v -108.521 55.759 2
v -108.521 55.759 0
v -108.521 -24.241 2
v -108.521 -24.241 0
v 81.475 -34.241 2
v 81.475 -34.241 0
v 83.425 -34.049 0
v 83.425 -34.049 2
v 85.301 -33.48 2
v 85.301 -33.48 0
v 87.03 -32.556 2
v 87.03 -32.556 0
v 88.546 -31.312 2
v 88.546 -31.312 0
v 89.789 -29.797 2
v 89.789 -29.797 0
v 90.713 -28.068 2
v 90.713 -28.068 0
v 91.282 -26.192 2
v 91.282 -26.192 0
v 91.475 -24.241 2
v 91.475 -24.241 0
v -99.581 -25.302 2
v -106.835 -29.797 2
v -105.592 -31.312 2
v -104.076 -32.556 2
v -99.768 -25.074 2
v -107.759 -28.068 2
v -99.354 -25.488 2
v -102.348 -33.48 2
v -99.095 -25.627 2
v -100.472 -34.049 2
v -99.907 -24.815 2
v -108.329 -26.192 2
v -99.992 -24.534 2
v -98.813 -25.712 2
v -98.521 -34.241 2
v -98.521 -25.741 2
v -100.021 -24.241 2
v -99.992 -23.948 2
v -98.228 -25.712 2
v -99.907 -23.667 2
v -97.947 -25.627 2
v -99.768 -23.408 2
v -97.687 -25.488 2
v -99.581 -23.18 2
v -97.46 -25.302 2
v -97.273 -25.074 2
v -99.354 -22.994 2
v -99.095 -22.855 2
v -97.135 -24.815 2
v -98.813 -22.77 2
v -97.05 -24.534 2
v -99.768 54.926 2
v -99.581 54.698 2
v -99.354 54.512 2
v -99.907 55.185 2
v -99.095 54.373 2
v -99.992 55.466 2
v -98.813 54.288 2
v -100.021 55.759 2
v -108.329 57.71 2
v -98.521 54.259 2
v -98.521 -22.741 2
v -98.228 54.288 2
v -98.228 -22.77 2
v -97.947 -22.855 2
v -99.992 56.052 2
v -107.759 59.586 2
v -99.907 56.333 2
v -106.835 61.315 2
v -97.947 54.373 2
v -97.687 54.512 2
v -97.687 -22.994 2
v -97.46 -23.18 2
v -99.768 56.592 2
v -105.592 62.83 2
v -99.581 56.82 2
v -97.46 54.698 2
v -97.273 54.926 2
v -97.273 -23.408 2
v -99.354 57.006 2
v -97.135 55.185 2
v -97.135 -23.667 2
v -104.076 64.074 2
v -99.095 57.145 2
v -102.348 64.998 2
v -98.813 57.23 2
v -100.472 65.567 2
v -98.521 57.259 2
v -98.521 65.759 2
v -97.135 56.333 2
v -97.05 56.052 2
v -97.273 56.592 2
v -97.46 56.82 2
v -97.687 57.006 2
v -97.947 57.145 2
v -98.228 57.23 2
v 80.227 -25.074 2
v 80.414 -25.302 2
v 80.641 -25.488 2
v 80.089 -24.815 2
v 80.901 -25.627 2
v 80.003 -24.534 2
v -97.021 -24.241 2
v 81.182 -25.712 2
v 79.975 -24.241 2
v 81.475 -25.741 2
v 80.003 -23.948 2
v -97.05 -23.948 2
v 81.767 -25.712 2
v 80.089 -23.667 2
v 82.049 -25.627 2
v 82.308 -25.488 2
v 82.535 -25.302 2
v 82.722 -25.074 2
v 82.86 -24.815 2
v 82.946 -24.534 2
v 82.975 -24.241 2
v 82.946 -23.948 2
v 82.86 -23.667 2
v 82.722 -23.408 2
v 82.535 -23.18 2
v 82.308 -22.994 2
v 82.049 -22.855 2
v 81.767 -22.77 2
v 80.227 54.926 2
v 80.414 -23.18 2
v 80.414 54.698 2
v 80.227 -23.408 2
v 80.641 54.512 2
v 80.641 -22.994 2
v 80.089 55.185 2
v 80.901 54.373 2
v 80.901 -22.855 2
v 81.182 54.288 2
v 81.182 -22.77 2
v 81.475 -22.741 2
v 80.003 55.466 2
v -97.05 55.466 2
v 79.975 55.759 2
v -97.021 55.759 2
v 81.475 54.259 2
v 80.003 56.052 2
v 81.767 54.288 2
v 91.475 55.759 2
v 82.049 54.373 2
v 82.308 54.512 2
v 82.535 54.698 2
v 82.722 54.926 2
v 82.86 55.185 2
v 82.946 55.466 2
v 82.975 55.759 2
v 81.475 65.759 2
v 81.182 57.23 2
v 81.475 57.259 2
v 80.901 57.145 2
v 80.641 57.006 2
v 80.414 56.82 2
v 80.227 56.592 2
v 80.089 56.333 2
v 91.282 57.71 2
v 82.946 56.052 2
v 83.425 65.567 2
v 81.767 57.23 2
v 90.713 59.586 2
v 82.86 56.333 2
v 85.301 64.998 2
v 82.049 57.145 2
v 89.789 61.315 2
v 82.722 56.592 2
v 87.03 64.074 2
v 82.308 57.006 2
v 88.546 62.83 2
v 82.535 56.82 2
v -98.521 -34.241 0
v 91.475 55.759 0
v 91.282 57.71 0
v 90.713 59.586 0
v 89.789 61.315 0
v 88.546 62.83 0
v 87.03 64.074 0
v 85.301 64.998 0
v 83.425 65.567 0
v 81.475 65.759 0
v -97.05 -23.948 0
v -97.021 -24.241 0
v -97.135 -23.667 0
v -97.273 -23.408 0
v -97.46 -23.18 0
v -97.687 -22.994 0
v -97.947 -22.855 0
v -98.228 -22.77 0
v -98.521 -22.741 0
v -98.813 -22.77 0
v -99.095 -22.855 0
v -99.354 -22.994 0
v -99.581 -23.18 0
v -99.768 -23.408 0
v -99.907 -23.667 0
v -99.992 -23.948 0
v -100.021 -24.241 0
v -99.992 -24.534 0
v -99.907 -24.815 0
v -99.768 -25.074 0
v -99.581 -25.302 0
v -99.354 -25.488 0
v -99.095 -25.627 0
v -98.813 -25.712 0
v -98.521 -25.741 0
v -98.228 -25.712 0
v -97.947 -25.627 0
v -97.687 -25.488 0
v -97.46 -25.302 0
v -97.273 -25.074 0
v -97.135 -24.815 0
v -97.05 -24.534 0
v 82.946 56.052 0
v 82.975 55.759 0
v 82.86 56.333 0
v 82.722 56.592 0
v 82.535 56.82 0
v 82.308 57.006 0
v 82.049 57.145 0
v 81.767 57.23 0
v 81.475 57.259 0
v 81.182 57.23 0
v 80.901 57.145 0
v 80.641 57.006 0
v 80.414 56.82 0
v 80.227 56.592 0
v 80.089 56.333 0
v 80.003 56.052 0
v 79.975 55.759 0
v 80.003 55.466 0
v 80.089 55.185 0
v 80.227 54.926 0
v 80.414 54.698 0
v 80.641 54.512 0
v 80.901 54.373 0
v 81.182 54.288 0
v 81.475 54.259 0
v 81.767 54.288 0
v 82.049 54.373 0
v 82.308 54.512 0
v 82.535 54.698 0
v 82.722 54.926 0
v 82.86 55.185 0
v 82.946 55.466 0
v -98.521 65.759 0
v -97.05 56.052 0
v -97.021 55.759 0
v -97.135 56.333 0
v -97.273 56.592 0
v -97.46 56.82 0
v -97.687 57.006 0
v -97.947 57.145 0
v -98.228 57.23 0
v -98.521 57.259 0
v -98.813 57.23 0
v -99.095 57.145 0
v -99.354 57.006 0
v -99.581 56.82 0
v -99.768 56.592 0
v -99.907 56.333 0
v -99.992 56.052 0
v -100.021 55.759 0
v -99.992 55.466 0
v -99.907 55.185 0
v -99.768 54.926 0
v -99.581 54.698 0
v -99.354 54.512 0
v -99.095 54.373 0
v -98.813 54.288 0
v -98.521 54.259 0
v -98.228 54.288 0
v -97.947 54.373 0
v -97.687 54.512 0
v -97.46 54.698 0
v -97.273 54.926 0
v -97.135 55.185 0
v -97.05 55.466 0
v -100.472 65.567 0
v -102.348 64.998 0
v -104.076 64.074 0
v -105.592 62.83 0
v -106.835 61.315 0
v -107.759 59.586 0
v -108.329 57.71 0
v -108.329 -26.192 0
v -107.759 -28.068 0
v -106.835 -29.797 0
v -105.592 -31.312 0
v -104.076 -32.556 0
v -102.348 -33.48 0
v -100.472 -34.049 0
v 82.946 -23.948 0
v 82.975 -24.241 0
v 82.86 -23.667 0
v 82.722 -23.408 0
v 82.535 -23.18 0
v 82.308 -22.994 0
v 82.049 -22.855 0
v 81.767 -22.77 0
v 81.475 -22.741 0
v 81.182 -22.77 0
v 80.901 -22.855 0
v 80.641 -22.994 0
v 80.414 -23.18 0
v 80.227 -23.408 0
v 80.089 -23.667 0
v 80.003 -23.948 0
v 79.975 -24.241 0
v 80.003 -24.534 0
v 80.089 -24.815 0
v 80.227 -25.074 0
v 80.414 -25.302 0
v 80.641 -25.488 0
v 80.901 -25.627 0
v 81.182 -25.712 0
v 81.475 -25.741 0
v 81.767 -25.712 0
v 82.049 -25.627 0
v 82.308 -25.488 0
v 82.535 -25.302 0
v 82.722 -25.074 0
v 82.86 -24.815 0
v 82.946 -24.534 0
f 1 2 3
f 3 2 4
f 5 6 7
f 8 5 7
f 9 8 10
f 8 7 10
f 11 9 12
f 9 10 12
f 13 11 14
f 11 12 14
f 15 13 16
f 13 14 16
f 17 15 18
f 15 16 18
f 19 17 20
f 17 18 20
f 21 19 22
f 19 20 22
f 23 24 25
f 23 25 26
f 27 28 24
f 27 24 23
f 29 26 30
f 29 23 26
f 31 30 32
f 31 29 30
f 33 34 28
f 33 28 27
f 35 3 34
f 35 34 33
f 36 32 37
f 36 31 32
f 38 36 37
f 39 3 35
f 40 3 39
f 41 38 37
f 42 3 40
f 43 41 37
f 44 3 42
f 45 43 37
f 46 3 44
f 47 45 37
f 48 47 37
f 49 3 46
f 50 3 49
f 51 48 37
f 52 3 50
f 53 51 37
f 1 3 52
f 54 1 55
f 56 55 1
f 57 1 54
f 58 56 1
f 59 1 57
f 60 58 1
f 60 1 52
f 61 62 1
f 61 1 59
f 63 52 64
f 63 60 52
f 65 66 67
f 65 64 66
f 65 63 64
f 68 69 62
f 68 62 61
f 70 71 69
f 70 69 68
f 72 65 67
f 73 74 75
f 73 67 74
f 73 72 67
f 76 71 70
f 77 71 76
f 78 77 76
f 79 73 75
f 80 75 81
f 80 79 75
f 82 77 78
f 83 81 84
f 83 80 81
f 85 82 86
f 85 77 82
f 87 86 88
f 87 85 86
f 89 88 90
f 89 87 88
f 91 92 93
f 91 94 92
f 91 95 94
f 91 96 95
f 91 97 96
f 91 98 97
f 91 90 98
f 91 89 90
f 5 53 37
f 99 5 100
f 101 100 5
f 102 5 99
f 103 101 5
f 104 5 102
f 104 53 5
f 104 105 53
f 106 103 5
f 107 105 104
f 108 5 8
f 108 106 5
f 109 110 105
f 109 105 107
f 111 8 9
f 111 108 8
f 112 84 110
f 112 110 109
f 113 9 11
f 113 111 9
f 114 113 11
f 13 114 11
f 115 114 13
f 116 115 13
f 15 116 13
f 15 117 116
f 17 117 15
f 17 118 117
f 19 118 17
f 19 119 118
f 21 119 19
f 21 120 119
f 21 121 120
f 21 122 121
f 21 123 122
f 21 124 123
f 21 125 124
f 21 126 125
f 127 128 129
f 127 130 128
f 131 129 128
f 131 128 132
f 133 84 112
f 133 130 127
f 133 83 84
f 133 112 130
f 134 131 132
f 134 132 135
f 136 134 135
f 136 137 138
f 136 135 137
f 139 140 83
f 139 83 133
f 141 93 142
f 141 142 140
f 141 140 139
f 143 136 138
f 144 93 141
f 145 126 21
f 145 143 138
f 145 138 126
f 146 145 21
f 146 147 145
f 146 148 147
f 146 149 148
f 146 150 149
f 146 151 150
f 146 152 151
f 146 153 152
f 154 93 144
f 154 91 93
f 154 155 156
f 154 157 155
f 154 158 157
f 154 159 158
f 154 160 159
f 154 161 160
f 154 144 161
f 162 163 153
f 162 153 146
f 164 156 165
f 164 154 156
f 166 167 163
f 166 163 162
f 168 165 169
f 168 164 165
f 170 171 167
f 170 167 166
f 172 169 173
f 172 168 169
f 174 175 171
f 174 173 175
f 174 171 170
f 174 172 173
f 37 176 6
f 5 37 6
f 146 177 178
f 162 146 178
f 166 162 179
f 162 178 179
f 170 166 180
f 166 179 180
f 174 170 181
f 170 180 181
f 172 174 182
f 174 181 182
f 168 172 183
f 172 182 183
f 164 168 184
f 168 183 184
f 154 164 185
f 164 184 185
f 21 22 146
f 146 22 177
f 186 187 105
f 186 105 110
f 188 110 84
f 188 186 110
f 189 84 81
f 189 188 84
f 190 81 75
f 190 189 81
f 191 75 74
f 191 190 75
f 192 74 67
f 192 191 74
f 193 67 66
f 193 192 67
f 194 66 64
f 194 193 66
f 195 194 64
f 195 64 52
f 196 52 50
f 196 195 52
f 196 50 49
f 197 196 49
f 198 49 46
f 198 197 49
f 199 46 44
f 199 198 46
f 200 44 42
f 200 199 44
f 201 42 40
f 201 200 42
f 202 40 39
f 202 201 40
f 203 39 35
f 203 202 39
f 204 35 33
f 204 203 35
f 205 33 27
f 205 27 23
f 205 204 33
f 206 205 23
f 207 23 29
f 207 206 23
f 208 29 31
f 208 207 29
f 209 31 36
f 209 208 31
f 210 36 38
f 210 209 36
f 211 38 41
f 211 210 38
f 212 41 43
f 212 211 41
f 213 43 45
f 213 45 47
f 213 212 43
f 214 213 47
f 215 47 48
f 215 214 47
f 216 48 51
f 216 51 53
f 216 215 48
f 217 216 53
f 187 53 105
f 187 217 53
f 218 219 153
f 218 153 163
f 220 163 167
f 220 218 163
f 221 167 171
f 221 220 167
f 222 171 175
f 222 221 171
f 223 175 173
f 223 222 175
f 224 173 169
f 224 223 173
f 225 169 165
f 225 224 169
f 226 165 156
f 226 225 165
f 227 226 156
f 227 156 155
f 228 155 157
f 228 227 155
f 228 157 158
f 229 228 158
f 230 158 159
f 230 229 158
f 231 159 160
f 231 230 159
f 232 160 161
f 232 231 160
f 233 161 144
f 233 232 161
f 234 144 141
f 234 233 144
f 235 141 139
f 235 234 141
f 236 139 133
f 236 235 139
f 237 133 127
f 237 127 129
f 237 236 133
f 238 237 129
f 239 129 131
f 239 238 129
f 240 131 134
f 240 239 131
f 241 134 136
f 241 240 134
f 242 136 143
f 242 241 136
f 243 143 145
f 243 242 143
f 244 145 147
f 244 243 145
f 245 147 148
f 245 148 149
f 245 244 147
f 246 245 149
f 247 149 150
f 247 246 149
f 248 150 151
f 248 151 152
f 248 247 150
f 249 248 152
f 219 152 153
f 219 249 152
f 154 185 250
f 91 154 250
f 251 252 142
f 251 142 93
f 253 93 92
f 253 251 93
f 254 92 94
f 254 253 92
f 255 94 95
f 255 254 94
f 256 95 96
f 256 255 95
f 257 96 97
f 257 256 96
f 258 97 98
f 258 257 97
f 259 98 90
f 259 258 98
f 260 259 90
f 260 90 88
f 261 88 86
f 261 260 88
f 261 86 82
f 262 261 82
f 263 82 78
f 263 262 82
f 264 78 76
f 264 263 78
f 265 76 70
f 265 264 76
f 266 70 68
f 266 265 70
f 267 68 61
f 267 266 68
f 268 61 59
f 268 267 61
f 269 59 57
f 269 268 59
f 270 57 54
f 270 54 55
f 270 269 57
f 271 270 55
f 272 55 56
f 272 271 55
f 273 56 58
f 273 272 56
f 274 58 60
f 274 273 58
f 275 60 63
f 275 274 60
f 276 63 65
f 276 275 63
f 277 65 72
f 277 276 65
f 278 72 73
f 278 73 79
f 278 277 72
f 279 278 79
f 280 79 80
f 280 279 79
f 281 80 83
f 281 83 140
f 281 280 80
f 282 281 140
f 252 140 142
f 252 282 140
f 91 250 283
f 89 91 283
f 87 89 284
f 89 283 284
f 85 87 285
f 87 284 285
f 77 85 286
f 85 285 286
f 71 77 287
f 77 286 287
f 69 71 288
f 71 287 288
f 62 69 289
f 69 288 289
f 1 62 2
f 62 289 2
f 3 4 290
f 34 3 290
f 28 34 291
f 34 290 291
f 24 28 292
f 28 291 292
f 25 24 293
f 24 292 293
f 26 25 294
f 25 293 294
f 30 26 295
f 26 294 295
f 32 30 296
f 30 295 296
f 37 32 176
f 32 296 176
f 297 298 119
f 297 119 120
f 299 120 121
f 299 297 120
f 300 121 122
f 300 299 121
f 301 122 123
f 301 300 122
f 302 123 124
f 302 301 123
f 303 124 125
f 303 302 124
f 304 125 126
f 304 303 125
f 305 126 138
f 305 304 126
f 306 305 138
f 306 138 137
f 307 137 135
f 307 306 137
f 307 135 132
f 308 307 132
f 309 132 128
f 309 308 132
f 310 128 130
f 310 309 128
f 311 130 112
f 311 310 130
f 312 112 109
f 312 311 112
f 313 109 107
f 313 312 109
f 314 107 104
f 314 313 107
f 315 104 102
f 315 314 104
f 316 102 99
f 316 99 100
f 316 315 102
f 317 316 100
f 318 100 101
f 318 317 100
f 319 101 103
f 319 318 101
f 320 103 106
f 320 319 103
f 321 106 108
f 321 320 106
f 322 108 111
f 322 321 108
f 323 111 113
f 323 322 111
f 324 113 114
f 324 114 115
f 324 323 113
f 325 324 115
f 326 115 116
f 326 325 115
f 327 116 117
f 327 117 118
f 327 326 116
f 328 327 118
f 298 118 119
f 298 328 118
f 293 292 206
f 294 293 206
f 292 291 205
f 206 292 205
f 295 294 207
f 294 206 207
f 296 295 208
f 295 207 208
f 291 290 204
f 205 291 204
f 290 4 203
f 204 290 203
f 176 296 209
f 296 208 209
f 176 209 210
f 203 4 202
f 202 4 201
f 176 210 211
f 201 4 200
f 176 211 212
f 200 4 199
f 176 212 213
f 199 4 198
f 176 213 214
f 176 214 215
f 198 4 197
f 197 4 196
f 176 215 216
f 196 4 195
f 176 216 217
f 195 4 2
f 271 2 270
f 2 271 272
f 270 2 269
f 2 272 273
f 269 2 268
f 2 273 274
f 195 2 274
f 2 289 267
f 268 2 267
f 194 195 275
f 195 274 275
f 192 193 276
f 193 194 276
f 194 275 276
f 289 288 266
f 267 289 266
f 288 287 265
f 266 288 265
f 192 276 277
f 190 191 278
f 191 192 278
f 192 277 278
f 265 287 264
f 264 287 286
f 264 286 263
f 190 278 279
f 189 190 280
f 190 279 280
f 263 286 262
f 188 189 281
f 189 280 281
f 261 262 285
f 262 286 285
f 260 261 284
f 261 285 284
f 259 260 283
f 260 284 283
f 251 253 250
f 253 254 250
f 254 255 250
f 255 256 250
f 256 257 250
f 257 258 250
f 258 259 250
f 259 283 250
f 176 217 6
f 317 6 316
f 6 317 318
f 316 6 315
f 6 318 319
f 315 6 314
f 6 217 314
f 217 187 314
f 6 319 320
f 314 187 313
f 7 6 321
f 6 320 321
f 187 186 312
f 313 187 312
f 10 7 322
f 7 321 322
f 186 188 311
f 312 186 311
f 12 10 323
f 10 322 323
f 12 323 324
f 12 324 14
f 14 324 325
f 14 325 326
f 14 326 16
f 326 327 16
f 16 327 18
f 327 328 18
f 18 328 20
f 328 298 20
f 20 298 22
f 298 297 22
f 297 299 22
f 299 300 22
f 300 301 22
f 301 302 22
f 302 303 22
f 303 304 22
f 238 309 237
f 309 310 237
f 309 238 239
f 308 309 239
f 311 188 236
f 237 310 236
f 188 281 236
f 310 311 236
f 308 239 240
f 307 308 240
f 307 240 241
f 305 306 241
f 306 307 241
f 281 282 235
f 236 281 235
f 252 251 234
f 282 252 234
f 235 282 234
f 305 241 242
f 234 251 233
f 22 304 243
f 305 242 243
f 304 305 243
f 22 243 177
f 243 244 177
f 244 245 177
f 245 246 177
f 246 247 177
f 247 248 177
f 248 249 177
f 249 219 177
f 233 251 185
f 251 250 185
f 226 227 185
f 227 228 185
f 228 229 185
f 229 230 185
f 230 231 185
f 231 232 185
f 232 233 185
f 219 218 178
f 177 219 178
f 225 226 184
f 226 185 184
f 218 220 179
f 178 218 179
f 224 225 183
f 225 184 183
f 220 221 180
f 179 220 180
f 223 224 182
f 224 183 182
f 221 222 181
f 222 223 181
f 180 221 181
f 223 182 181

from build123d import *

# Parameters (mm, degrees)
SKETCH1_R           = 1.5
BOSS_EXTRUDE1_DEPTH = 2


with BuildPart() as part:
    # Sketch1 → Boss-Extrude1 (new body)
    with BuildSketch(Plane.XY):
        with BuildLine():
            Line((-108.52070268, 55.759093245), (-108.52070268, 27.009093245))
            Line((-108.52070268, 27.009093245), (-108.52070268, 4.509093245))
            Line((-108.52070268, 4.509093245), (-108.52070268, -24.240906755))
            ThreePointArc((-108.52070268, -24.240906755), (-105.591770492, -31.311974567), (-98.52070268, -34.240906755))
            Line((-98.52070268, -34.240906755), (81.474525228, -34.240906755))
            ThreePointArc((81.474525228, -34.240906755), (88.545593039, -31.311974567), (91.474525228, -24.240906755))
            Line((91.474525228, -24.240906755), (91.474525228, 4.509093245))
            Line((91.474525228, 4.509093245), (91.474525228, 27.009093245))
            Line((91.474525228, 27.009093245), (91.474525228, 55.759093245))
            ThreePointArc((91.474525228, 55.759093245), (88.545593039, 62.830161056), (81.474525228, 65.759093245))
            Line((81.474525228, 65.759093245), (-98.52070268, 65.759093245))
            ThreePointArc((-98.52070268, 65.759093245), (-105.591770492, 62.830161056), (-108.52070268, 55.759093245))
        make_face()
        with Locations((-98.52070268, 55.759093245)):
            Circle(SKETCH1_R, mode=Mode.SUBTRACT)
        with Locations((-98.52070268, -24.240906755)):
            Circle(SKETCH1_R, mode=Mode.SUBTRACT)
        with Locations((81.474525228, -24.240906755)):
            Circle(SKETCH1_R, mode=Mode.SUBTRACT)
        with Locations((81.474525228, 55.759093245)):
            Circle(SKETCH1_R, mode=Mode.SUBTRACT)
    extrude(amount=BOSS_EXTRUDE1_DEPTH)


solid = part.part
